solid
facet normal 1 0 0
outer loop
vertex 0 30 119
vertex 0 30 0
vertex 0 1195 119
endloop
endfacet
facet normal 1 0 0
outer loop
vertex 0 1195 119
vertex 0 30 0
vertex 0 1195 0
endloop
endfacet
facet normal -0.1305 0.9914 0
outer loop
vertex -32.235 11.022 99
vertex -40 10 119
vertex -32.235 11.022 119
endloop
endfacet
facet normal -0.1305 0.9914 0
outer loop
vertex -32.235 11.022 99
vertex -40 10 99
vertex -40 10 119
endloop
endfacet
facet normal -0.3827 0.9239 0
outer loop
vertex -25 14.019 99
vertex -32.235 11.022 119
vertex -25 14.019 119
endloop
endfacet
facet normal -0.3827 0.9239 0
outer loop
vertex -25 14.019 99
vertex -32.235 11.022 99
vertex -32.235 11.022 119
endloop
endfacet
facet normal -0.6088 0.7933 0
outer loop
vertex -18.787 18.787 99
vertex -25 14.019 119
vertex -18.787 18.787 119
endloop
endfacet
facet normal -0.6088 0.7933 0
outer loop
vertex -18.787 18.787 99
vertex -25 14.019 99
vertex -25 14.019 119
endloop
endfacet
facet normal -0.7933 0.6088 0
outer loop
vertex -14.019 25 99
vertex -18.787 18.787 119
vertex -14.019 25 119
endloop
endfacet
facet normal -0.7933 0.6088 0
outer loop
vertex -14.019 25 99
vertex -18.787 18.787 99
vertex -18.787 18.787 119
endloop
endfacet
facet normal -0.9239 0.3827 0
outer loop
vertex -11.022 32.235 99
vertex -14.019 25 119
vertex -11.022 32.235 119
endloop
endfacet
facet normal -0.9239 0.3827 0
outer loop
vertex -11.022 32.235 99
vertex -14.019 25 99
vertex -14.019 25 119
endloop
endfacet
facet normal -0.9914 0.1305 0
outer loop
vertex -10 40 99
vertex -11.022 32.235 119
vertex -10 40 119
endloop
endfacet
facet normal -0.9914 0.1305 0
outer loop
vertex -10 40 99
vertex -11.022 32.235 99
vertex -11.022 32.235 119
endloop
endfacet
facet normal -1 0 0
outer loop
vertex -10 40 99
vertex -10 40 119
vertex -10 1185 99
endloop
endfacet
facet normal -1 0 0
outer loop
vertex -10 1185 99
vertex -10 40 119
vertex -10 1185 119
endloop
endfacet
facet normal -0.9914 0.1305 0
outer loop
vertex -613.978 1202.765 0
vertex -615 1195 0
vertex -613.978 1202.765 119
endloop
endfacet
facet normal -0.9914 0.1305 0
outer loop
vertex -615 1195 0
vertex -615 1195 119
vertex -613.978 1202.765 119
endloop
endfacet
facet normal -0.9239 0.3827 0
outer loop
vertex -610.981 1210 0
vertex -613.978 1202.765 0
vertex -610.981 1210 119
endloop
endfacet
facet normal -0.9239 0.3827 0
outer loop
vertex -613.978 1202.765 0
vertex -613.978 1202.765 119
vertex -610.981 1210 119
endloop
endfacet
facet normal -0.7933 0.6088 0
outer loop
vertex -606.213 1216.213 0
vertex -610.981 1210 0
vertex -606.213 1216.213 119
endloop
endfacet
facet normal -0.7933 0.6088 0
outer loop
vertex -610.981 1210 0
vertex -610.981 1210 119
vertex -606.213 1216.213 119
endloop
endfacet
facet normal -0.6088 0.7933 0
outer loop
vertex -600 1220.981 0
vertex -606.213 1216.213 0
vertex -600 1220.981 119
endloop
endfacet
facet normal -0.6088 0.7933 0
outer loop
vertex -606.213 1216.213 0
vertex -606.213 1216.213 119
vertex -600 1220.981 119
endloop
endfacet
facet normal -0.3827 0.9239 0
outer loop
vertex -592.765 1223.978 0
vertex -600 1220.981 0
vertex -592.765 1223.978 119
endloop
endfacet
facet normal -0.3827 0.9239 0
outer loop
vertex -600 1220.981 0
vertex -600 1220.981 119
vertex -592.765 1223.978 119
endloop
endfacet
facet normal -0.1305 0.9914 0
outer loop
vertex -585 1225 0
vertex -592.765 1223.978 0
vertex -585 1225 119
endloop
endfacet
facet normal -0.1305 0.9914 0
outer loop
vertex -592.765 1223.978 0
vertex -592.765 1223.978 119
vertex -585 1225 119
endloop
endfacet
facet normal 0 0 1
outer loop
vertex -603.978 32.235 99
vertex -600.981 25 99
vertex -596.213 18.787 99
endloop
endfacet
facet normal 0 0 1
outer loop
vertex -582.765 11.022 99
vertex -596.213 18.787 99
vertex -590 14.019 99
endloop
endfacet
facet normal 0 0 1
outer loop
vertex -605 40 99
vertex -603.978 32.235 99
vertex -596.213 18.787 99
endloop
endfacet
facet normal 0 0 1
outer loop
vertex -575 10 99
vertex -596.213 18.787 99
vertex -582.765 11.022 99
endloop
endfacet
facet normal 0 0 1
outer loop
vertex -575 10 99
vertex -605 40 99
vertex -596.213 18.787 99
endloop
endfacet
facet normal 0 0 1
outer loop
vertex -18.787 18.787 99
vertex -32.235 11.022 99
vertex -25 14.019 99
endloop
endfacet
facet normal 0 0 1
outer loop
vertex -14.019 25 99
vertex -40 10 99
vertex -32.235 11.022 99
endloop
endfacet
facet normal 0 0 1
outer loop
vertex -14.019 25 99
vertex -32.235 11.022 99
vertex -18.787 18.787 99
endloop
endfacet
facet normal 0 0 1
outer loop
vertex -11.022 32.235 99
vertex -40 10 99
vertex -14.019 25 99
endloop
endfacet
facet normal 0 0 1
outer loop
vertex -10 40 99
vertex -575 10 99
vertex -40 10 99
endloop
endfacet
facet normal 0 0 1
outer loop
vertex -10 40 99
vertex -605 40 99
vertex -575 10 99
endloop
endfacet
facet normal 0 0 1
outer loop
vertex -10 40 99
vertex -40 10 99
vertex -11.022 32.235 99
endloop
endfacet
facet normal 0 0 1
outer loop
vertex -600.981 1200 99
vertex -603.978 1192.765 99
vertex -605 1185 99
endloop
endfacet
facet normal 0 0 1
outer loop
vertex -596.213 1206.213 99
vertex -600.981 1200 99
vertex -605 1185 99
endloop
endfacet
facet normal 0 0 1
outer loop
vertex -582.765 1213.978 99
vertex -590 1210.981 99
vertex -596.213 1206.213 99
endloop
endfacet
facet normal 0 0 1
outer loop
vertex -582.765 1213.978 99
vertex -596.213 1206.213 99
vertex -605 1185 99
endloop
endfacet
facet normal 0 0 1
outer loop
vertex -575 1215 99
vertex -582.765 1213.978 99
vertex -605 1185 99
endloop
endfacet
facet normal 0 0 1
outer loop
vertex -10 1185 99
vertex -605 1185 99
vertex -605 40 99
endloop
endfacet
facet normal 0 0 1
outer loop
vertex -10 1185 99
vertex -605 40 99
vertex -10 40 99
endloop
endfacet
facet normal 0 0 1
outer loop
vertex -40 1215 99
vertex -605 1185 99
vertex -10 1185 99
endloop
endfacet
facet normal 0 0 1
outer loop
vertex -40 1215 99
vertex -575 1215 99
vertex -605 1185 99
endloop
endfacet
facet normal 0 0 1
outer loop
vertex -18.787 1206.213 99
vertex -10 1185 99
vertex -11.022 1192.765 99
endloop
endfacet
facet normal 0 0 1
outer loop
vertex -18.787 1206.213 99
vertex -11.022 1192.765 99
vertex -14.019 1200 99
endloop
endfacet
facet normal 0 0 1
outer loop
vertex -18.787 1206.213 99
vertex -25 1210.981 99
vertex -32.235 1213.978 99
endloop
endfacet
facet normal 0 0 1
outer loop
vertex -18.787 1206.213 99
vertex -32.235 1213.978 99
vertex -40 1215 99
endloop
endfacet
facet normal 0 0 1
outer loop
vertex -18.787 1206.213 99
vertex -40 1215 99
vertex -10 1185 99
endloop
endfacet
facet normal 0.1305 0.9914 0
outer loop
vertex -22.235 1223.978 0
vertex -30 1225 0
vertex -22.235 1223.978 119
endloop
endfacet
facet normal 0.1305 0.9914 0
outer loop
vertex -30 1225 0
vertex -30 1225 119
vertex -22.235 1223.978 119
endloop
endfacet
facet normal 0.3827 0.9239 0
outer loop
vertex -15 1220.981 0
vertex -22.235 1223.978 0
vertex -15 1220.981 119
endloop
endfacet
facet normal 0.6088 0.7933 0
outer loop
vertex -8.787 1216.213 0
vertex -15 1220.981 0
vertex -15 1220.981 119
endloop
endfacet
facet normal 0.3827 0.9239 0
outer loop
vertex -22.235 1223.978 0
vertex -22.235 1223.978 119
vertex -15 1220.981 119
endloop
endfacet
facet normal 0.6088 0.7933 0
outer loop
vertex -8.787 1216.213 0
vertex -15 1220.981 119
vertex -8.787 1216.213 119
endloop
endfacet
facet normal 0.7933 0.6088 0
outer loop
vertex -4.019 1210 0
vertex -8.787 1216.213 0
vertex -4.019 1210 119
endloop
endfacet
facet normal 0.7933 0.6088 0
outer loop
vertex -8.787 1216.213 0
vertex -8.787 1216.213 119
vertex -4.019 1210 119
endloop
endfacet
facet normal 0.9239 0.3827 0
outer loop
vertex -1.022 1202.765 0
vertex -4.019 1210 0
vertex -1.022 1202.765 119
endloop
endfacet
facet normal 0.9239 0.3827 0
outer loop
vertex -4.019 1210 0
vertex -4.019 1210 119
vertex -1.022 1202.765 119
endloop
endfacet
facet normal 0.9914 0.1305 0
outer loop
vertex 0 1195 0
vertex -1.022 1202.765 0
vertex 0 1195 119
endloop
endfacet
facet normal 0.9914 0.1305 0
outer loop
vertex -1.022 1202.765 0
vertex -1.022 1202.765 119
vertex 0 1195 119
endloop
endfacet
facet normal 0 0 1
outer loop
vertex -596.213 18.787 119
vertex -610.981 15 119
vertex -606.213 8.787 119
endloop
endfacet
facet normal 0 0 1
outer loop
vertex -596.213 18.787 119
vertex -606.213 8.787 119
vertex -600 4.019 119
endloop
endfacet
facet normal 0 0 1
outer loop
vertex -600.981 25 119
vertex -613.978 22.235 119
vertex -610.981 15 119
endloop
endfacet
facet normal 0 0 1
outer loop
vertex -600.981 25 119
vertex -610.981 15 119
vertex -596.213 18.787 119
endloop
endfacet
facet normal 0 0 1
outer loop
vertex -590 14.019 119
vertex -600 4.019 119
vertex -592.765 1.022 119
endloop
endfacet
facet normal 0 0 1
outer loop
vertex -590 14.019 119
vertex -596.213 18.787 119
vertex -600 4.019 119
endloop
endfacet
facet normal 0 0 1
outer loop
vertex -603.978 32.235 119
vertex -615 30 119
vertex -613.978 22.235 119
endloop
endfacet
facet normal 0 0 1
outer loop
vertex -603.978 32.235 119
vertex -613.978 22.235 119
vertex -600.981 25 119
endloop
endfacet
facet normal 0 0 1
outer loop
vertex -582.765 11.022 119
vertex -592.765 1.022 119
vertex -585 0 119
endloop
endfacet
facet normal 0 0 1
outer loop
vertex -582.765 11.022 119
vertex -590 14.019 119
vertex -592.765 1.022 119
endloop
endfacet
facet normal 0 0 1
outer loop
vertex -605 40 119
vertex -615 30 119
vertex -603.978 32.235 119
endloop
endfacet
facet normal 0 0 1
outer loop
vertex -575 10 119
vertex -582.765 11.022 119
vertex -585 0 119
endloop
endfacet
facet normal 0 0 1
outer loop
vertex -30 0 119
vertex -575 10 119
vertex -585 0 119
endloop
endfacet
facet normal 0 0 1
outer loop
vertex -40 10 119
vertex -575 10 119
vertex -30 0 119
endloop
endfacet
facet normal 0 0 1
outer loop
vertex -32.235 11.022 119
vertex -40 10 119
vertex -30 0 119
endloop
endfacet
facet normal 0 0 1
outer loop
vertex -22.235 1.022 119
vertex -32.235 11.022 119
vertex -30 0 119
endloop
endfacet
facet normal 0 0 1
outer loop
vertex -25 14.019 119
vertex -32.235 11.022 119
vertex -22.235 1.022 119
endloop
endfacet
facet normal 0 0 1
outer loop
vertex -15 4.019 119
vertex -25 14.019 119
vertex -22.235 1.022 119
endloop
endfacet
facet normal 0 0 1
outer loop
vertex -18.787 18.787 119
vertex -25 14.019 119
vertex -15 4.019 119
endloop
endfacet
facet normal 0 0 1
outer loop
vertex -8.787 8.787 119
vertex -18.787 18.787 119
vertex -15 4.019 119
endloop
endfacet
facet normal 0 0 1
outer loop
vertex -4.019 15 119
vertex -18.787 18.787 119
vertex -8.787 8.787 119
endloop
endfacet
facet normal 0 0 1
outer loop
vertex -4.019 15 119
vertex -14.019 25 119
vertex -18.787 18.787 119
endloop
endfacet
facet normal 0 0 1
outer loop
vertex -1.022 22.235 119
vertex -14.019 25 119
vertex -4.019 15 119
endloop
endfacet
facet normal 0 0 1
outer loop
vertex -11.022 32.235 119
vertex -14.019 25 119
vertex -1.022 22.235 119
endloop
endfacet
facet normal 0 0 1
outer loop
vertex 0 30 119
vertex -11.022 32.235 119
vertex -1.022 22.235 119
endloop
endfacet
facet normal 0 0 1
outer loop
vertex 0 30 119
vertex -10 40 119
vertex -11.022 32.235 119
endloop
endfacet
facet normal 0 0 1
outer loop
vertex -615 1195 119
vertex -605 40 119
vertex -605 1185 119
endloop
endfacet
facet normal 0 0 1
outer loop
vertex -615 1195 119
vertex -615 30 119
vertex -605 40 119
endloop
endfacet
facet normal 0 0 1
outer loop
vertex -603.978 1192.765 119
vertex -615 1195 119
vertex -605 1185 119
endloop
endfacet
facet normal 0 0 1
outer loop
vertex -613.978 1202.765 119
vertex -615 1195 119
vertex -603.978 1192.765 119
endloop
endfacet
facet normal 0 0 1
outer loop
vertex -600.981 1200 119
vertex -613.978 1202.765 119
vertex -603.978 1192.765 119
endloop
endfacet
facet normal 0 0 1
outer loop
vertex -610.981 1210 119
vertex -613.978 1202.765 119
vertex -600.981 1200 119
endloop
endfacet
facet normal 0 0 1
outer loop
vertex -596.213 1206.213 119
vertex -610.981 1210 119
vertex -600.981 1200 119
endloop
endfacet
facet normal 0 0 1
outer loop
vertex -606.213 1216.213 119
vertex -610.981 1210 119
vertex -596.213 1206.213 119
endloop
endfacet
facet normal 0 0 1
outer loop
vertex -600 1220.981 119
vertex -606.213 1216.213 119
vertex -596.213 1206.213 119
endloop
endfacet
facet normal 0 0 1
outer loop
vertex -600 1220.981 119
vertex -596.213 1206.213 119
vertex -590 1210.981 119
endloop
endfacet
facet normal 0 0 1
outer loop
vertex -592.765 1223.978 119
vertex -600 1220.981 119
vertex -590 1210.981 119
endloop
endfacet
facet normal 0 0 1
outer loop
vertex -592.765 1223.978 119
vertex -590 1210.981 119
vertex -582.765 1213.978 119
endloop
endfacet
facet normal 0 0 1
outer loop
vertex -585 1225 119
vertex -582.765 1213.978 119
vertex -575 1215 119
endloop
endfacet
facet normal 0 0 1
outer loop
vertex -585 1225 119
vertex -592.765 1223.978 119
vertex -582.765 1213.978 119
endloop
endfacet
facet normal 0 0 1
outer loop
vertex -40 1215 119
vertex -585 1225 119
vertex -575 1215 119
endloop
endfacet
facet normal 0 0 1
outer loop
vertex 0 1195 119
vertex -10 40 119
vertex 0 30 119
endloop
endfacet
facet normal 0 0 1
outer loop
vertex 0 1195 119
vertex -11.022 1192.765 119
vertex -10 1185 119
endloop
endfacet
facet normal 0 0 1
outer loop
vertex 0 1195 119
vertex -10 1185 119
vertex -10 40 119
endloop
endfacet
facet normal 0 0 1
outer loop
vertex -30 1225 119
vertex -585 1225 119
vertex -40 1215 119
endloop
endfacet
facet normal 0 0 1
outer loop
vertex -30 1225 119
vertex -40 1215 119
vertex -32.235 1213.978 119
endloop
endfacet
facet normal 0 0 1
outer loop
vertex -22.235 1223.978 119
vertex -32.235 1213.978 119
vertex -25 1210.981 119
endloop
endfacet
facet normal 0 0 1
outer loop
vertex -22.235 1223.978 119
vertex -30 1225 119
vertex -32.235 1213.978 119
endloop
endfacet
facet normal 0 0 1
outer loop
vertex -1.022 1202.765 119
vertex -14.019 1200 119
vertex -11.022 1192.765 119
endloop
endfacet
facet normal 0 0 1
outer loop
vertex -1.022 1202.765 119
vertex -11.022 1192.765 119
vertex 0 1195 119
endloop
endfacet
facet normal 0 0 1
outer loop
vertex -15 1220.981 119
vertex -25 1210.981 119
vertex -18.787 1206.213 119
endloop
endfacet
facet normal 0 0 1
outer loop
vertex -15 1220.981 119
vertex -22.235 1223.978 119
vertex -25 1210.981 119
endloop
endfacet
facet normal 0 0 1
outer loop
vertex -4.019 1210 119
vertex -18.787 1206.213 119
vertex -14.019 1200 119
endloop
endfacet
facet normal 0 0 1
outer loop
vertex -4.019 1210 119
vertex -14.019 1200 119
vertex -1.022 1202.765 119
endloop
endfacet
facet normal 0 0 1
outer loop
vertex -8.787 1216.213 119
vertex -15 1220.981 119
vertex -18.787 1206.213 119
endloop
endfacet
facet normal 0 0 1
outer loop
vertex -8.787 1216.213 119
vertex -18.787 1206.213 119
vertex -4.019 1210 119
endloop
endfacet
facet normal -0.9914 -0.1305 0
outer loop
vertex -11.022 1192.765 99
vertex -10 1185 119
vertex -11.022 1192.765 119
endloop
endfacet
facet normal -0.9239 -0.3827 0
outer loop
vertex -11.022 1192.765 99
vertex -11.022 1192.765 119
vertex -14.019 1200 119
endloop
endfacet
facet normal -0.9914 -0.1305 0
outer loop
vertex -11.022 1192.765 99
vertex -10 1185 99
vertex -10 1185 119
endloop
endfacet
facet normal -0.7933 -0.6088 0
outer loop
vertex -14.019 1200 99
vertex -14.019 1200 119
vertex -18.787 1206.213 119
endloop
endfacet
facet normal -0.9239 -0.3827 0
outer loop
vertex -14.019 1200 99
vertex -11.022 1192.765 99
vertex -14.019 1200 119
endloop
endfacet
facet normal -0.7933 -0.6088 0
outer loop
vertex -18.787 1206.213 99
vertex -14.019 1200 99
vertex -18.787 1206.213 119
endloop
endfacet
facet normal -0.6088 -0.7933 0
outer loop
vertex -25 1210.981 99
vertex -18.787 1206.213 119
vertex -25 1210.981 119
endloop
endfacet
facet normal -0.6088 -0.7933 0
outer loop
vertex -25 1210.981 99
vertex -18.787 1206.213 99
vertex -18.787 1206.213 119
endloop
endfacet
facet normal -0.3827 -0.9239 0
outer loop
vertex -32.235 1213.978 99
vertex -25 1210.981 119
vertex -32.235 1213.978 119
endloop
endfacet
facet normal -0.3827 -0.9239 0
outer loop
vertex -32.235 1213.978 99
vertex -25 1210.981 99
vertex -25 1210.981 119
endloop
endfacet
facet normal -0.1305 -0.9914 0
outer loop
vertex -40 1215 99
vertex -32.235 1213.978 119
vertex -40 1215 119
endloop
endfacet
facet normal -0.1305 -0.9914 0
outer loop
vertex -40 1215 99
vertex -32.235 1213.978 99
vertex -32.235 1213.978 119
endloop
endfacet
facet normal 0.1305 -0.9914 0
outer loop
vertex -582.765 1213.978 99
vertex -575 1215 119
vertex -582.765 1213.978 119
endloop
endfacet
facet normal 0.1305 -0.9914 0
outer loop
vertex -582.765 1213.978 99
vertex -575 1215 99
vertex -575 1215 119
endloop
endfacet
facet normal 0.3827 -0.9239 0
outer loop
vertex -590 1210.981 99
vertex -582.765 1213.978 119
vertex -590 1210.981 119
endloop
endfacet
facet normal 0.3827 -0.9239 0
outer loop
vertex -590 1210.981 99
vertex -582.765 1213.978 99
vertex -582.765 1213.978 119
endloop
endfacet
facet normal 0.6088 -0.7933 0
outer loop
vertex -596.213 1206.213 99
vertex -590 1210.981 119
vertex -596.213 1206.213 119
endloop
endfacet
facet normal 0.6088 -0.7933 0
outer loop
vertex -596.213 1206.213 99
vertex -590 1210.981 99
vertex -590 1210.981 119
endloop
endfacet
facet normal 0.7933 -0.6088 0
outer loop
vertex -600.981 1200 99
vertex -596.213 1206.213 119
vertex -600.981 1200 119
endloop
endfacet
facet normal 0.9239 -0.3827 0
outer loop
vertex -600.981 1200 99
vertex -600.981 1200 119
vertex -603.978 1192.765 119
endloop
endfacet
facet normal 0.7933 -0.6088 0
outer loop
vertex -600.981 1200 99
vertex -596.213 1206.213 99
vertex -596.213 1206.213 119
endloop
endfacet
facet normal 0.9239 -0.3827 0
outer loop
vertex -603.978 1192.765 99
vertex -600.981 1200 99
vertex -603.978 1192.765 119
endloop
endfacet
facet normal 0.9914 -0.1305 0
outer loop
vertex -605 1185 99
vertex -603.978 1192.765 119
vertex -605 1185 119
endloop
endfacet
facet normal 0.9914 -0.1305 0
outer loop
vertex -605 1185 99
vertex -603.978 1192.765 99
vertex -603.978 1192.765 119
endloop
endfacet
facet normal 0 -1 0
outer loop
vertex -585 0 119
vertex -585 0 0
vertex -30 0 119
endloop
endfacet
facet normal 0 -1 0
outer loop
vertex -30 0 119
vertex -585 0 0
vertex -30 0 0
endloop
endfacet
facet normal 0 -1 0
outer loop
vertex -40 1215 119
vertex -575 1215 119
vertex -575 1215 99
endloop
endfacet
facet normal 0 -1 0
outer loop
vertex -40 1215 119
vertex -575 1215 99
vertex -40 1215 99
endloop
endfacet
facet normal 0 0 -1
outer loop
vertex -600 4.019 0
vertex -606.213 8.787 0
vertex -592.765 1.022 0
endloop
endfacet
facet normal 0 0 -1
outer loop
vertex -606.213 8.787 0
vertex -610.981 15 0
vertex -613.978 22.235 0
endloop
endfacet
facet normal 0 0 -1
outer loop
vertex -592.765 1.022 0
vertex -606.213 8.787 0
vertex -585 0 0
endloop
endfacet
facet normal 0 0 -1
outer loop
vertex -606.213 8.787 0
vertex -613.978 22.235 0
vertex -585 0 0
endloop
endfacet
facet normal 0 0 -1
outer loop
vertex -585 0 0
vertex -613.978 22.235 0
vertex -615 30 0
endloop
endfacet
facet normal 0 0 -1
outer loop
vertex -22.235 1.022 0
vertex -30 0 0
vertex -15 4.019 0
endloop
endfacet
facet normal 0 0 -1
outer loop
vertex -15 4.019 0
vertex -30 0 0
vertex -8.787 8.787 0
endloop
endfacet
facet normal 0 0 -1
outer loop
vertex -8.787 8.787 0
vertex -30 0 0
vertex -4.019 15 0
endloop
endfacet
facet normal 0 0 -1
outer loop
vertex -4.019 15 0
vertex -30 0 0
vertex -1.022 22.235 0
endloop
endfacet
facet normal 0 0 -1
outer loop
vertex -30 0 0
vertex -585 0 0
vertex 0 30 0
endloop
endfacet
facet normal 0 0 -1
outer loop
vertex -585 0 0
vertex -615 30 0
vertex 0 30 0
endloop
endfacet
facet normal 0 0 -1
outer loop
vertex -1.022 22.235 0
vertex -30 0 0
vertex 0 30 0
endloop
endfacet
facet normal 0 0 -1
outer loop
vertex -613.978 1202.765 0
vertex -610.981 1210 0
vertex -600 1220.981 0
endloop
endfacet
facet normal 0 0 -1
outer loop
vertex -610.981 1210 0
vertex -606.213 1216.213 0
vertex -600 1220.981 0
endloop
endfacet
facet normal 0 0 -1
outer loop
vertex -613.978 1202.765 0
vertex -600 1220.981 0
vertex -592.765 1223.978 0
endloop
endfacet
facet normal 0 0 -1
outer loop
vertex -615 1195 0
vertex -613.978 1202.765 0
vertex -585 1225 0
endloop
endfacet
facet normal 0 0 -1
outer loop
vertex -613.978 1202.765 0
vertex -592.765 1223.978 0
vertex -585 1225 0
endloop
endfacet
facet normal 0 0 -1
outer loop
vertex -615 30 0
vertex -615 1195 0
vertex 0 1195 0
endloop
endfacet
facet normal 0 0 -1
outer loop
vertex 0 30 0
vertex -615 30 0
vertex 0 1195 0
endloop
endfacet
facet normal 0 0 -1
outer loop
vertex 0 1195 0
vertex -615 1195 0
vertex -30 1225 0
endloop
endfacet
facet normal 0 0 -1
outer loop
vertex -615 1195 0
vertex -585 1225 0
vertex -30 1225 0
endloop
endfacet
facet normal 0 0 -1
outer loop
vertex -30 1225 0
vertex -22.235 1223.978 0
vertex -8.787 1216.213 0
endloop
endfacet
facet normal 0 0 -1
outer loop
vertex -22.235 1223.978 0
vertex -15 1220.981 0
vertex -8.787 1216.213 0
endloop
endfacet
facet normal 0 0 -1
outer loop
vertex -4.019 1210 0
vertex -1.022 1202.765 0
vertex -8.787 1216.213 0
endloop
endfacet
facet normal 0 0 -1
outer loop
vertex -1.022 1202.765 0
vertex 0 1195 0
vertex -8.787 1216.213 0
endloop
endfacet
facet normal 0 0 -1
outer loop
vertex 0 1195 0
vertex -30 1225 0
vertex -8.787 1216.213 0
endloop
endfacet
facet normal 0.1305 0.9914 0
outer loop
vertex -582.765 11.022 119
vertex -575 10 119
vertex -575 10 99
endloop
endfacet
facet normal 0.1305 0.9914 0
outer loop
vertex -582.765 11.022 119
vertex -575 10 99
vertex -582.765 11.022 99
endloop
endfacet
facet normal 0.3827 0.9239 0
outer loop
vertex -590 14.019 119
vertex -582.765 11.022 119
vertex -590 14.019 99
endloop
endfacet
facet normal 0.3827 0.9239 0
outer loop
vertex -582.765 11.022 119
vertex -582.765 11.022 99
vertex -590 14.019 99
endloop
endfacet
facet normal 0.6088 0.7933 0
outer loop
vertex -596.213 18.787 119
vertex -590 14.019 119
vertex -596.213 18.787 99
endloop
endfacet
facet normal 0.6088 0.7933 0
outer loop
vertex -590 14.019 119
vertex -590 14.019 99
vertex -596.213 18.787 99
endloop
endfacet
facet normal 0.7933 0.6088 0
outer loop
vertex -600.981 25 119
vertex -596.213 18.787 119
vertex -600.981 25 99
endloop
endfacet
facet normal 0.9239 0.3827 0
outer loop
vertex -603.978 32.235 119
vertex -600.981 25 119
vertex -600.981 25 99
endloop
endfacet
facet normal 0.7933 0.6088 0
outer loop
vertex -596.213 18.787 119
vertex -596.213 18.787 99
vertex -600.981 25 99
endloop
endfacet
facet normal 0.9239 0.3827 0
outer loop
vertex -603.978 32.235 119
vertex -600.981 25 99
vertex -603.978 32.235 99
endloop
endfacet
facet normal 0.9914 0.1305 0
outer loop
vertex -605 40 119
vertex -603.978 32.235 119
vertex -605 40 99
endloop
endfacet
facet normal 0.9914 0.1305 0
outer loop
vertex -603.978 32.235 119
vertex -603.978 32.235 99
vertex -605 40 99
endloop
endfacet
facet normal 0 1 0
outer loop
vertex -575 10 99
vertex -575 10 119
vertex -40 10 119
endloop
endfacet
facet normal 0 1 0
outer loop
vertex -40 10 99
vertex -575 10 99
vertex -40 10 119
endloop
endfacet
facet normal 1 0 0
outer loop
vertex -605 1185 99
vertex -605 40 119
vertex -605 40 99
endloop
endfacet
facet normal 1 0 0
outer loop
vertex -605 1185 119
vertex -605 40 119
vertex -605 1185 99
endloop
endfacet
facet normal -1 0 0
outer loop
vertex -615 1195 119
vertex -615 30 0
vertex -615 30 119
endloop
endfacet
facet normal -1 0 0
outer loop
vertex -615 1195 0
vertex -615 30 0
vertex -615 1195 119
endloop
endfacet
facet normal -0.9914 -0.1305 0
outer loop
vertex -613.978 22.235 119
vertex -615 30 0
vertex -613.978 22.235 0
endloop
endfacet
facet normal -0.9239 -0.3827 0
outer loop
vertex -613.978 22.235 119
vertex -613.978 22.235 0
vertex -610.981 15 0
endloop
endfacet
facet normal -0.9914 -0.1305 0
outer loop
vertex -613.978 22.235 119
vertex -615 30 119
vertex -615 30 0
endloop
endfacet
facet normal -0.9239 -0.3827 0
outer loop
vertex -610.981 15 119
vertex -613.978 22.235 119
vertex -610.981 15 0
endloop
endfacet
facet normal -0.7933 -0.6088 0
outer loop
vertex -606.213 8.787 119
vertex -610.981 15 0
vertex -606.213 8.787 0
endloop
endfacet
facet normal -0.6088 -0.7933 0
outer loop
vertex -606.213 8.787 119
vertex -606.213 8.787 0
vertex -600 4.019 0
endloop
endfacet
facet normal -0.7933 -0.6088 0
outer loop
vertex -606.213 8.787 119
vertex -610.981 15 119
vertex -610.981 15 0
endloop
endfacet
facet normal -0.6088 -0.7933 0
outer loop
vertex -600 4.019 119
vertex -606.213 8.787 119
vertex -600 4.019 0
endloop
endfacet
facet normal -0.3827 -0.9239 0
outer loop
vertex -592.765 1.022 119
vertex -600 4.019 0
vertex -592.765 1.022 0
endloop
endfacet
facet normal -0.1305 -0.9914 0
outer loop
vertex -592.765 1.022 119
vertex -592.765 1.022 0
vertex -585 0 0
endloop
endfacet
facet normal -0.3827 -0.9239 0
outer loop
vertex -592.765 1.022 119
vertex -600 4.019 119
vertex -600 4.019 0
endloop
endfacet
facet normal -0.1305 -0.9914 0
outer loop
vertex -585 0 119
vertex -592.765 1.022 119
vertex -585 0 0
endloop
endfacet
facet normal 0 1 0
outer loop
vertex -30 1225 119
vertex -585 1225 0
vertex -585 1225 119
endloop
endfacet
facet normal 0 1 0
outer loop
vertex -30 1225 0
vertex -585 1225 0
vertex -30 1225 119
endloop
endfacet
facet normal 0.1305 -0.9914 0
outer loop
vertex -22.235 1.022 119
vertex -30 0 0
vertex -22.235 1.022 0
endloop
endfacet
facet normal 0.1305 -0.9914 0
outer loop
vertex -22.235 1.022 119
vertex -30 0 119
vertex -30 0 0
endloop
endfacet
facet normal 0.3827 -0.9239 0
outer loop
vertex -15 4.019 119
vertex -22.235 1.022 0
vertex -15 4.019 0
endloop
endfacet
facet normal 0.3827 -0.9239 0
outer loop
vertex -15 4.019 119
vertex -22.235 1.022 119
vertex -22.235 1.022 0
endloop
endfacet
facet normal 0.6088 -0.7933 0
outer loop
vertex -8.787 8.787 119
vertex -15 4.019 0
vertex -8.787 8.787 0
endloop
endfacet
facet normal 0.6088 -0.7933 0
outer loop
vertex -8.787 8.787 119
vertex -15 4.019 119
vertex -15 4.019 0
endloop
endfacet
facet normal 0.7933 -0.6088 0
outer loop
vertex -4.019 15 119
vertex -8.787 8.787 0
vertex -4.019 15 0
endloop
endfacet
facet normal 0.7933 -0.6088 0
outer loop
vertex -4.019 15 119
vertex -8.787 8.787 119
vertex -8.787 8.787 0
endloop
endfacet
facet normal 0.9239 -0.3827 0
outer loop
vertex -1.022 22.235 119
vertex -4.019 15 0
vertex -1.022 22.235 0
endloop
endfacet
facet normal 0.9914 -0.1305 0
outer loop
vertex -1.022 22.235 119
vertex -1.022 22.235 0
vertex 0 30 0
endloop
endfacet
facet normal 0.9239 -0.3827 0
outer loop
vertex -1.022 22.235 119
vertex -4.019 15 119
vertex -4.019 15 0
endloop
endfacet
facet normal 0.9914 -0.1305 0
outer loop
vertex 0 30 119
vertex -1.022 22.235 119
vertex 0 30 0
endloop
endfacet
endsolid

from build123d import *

# Parameters (mm, degrees)
SKETCH_1_W          = 615
SKETCH_1_H          = 1225
EXTRUDE_1_DEPTH     = 119
SKETCH_3_W          = 595
SKETCH_3_H          = 1205
CUT_EXTRUDE_1_DEPTH = 20
FILLET_3_R          = 30


with BuildPart() as part:
    # 스케치1 → 보스-돌출1 (new body)
    with BuildSketch(Plane.XY):
        with Locations((-307.5, 612.5)):
            Rectangle(SKETCH_1_W, SKETCH_1_H)
    extrude(amount=EXTRUDE_1_DEPTH)

    # 스케치3 → 컷-돌출1 (cut)
    with BuildSketch(Plane.XY.offset(119)):
        with Locations((-307.5, 612.5)):
            Rectangle(SKETCH_3_W, SKETCH_3_H)
    extrude(amount=-CUT_EXTRUDE_1_DEPTH, mode=Mode.SUBTRACT)

    # 필렛3
    fillet_3_edges = [part.edges().sort_by_distance(p)[0] for p in [
        (-10, 1215, 109),
        (-10, 10, 109),
        (-605, 10, 109),
        (-605, 1215, 109),
        (0, 0, 59.5),
        (-615, 0, 59.5),
        (-615, 1225, 59.5),
        (0, 1225, 59.5),
    ]]
    fillet(fillet_3_edges, radius=FILLET_3_R)


solid = part.part
